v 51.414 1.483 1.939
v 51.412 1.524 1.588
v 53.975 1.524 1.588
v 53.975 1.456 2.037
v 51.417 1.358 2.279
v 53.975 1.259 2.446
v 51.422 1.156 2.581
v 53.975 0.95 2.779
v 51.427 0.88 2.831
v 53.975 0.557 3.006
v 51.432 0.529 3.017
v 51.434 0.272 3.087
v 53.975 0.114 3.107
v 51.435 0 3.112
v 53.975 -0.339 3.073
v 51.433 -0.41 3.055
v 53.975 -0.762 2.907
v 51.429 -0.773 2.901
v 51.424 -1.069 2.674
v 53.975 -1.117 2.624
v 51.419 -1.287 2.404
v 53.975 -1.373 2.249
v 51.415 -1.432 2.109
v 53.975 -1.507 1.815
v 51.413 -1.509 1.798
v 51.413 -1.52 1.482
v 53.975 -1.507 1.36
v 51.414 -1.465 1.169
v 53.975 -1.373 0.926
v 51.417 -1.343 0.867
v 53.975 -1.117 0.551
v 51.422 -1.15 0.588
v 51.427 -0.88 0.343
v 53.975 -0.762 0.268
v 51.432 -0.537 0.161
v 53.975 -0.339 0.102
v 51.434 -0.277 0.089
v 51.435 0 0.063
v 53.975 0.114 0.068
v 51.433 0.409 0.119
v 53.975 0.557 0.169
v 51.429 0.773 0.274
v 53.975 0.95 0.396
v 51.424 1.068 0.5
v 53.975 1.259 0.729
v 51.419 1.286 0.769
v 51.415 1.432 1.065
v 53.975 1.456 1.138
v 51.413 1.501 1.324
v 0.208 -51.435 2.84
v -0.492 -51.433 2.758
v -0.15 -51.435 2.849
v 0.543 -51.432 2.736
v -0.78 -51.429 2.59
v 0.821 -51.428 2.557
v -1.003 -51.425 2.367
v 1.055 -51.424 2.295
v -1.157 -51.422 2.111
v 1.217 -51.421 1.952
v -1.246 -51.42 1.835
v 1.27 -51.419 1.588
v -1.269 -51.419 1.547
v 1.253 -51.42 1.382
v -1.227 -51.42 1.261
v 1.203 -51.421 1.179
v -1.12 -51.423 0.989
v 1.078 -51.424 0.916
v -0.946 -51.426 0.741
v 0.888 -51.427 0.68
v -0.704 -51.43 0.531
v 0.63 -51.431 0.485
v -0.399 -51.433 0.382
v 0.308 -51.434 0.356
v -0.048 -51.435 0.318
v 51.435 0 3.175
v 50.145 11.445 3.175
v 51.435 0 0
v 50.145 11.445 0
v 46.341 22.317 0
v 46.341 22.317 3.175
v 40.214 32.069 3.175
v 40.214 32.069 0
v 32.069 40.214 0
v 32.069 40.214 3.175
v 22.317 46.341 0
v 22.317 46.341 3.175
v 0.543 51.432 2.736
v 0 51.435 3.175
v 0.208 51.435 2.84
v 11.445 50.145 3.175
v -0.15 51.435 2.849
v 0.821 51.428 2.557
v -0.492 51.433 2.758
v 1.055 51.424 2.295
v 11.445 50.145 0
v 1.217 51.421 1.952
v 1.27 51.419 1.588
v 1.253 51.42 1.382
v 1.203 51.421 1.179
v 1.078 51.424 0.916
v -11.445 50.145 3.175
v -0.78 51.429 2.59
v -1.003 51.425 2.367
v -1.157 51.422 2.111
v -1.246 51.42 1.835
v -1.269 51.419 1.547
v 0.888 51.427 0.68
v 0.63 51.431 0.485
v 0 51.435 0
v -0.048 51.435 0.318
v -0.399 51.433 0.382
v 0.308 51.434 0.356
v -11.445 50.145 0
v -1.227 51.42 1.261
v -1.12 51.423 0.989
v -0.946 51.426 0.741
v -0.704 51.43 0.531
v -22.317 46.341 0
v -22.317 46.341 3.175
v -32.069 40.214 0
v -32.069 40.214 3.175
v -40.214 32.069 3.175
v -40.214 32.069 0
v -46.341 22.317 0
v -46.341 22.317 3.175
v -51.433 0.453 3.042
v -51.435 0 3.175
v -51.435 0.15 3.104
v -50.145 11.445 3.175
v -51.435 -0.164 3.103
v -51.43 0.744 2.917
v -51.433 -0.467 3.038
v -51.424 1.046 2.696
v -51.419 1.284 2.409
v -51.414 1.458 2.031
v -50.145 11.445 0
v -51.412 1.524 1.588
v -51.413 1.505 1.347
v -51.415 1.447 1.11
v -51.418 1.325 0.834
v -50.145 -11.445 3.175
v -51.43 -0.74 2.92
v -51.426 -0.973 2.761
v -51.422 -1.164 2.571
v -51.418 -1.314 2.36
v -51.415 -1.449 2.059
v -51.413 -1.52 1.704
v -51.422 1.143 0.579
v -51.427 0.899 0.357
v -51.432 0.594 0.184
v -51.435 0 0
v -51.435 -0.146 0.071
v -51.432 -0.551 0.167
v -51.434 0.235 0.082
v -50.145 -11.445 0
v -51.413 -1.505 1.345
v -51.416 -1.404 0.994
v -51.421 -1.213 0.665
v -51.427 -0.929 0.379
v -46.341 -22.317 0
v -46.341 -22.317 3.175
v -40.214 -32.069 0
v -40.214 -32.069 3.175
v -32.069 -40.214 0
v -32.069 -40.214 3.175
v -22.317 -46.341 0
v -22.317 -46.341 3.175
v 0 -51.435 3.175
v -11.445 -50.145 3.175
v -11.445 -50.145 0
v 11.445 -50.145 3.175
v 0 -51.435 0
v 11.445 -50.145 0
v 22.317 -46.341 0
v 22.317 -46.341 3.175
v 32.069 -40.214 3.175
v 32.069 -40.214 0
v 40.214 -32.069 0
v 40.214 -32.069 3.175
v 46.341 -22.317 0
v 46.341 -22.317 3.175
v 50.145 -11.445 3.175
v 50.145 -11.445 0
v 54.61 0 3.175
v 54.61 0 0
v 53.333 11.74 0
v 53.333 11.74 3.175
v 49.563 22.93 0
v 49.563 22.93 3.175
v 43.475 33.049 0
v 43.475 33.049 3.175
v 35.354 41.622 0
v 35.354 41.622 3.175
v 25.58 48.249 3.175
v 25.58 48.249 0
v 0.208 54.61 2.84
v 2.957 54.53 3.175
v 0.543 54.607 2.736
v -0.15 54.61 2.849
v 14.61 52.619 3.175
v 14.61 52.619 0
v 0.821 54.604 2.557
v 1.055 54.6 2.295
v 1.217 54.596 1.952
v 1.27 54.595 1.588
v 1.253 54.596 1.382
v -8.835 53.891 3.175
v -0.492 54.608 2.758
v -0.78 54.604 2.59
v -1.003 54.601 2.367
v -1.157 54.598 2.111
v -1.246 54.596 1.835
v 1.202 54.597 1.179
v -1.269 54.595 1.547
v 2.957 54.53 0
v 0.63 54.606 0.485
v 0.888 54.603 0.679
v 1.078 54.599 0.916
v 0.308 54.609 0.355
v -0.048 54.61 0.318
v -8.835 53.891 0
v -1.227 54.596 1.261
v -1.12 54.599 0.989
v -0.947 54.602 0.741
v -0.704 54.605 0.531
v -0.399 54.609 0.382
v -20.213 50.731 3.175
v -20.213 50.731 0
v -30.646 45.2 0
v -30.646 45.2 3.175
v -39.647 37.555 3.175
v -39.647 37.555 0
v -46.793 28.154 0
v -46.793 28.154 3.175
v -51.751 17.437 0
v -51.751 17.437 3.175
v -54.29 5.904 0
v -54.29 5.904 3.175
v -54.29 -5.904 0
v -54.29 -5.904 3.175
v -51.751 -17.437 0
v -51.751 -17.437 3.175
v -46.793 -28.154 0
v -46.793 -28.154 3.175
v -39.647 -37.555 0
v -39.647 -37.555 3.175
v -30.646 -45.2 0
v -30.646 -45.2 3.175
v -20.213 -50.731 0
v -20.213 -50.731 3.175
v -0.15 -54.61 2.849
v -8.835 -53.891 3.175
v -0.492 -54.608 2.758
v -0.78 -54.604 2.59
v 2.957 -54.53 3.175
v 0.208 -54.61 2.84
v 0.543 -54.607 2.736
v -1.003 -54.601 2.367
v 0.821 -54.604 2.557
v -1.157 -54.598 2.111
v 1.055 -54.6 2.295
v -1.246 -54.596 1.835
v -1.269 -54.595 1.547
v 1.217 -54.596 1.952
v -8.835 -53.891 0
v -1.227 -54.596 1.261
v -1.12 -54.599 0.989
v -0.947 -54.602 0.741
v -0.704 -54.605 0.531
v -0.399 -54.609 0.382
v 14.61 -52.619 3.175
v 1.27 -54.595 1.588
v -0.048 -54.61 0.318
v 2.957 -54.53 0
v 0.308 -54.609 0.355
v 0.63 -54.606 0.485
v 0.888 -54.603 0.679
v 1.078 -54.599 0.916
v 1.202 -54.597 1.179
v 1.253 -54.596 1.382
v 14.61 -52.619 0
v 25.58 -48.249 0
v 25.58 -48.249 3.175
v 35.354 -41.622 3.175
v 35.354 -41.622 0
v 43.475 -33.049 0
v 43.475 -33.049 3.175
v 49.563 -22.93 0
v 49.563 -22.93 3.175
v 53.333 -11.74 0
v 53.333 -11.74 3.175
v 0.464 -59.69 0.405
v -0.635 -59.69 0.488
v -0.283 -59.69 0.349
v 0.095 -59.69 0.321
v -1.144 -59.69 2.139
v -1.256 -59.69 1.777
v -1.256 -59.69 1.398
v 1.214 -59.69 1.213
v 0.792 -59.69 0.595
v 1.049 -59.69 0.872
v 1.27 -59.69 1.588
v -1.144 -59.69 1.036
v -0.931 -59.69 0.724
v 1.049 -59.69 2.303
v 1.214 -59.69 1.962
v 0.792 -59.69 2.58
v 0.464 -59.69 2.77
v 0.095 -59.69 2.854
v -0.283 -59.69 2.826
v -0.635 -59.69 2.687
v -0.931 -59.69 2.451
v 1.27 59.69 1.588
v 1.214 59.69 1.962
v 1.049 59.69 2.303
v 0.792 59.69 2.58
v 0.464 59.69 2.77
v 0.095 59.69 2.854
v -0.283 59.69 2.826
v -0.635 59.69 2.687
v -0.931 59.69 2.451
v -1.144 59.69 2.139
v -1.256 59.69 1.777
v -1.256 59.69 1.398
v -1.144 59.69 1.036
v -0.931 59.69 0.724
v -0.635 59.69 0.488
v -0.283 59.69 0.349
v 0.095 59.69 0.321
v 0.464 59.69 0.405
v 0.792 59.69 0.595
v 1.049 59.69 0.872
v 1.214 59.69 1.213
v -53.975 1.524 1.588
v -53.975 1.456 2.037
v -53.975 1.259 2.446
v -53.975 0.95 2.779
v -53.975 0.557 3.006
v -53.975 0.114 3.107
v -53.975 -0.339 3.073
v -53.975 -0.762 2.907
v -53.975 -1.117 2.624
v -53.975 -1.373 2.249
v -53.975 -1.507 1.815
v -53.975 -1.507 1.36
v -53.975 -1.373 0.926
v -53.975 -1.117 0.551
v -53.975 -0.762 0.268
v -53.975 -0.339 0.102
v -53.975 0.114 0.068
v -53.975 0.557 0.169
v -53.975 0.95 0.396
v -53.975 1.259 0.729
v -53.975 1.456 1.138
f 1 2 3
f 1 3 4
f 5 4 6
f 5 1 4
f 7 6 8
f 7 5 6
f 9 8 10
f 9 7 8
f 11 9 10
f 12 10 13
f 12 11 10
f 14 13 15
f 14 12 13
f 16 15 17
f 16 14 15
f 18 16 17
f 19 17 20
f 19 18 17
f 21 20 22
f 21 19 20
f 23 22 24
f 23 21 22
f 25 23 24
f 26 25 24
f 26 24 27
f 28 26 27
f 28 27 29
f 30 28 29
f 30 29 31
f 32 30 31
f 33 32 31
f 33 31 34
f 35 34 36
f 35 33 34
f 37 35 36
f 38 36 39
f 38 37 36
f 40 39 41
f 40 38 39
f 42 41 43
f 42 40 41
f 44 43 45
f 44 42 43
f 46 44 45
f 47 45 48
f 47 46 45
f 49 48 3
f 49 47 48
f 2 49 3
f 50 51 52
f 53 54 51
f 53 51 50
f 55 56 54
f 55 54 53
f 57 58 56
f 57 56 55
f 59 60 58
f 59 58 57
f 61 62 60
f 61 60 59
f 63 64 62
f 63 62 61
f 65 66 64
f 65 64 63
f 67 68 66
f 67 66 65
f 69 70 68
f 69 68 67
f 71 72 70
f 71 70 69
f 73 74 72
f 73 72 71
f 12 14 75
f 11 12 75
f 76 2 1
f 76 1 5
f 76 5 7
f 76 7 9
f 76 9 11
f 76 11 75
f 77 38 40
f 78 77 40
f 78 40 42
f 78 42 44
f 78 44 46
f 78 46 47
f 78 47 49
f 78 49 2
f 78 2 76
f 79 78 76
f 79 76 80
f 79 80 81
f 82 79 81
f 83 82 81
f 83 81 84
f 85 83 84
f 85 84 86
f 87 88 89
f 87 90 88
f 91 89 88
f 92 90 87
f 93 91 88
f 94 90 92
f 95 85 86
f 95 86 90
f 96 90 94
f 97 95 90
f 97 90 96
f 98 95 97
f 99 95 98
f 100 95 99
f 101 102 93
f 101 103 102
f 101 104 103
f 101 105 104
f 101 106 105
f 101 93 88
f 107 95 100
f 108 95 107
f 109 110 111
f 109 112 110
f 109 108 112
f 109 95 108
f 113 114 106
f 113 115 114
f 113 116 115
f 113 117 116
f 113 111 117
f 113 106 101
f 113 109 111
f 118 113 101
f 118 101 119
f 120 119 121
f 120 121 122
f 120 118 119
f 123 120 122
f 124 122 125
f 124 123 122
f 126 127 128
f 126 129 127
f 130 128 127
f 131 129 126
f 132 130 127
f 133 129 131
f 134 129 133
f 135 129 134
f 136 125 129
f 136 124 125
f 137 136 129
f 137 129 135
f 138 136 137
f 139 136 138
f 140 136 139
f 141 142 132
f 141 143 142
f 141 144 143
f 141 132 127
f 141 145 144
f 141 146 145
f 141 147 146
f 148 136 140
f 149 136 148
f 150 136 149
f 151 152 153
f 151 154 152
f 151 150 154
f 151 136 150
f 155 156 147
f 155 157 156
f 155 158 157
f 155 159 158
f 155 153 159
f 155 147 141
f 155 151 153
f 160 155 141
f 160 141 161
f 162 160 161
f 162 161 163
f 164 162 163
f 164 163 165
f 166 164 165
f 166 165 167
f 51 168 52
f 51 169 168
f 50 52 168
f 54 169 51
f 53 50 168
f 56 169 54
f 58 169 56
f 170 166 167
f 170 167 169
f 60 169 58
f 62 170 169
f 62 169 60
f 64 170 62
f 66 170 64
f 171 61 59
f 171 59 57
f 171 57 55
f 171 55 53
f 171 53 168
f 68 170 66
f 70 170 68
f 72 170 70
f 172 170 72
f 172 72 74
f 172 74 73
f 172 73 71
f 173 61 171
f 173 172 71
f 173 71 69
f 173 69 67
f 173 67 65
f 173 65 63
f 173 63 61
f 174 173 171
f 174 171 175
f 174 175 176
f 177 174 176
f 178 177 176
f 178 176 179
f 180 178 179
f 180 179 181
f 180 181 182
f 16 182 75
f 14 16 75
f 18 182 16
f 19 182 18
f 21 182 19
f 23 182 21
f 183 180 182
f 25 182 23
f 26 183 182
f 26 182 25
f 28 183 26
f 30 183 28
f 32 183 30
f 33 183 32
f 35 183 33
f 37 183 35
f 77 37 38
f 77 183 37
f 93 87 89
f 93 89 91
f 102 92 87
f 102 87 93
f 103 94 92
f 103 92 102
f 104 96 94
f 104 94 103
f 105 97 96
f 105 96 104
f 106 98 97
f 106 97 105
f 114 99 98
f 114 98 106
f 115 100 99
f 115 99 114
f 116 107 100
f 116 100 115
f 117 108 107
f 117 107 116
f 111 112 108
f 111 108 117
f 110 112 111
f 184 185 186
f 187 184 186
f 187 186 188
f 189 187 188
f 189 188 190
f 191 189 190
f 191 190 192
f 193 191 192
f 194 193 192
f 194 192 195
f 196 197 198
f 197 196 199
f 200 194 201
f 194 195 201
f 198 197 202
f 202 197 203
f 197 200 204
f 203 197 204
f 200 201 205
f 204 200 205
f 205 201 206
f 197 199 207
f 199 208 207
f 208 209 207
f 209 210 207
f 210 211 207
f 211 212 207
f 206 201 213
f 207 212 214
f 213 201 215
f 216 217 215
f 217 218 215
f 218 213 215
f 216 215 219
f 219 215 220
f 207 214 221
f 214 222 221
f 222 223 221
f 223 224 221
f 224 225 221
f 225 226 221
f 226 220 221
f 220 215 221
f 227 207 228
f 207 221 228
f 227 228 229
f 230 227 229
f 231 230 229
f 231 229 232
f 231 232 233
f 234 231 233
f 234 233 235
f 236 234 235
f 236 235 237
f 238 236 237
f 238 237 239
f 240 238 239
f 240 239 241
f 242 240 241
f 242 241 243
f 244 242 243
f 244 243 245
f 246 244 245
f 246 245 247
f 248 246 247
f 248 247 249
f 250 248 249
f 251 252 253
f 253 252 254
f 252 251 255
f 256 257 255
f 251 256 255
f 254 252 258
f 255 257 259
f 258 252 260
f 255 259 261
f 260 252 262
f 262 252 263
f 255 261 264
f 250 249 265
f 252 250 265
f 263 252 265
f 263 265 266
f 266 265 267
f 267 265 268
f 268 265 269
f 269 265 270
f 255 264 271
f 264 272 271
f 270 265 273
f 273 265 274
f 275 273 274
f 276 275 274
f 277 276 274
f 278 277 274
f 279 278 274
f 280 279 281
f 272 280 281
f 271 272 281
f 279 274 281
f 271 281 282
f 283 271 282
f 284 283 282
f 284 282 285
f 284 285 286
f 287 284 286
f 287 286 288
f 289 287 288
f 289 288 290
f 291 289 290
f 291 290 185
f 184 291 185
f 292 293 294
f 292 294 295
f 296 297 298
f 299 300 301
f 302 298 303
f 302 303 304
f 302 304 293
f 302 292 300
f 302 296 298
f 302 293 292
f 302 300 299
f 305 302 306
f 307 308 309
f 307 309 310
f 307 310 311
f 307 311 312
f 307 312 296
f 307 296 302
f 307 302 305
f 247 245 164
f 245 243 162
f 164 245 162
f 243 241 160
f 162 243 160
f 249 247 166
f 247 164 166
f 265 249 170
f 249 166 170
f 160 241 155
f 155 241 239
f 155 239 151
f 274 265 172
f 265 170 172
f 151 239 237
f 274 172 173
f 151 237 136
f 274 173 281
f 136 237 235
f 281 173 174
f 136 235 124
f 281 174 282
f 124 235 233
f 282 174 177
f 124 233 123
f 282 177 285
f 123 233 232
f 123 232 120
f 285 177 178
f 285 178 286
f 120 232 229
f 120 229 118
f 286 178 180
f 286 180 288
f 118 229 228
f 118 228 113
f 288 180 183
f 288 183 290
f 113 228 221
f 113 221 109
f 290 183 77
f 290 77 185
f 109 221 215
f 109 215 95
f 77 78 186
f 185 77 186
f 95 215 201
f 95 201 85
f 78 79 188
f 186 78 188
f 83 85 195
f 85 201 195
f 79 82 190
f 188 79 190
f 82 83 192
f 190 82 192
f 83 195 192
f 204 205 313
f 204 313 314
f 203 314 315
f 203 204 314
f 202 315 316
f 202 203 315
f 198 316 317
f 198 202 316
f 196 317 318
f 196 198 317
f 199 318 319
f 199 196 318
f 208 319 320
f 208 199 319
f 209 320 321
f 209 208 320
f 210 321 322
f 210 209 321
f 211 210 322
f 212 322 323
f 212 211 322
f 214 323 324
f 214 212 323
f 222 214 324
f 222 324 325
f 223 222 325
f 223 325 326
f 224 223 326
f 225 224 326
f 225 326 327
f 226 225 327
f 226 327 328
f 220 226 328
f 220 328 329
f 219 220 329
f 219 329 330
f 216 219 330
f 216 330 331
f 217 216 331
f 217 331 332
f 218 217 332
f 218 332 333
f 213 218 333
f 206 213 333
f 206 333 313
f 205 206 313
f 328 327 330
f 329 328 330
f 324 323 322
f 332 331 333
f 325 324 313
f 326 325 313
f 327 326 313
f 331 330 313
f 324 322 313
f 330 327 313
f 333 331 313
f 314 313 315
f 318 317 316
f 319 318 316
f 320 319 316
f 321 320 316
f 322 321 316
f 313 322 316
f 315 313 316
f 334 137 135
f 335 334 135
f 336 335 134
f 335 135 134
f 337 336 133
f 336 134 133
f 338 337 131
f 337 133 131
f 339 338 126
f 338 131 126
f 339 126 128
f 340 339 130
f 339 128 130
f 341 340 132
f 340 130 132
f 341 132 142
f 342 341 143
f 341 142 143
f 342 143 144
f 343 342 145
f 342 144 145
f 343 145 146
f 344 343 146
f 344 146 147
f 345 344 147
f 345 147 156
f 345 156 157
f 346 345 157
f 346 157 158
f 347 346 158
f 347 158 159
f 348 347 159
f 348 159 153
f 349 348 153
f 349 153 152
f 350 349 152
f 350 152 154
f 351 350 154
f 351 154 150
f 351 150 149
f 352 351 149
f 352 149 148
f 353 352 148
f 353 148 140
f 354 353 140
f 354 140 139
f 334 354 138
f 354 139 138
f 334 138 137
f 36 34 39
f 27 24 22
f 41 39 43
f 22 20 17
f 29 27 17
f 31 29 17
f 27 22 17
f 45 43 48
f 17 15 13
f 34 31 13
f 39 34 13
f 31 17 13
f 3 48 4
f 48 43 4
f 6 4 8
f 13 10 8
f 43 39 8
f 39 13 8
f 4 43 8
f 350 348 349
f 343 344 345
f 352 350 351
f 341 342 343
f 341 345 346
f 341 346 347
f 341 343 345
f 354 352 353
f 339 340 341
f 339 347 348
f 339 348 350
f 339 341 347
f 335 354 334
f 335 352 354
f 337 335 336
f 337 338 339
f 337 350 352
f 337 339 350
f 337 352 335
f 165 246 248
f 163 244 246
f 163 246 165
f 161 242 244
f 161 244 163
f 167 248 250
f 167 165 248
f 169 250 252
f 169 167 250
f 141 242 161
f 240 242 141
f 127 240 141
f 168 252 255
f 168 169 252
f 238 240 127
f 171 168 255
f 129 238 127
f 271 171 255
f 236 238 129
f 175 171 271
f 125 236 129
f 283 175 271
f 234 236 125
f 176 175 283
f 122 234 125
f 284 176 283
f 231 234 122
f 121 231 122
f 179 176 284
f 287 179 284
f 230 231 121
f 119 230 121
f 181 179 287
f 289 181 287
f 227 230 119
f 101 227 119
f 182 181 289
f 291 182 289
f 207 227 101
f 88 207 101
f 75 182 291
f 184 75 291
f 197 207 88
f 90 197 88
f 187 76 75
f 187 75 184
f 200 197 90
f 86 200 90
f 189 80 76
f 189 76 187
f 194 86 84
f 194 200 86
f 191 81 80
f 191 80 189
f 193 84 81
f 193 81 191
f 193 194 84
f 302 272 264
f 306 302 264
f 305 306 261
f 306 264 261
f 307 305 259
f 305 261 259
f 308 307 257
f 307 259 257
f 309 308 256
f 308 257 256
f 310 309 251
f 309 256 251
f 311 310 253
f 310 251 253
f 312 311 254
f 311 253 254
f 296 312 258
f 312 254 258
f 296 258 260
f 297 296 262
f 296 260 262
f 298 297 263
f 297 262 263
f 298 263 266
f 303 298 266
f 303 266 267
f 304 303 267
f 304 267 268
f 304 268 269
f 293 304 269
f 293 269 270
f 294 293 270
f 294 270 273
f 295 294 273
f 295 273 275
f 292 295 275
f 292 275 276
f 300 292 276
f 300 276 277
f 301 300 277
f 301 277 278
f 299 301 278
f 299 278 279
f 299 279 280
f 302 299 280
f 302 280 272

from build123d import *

# Parameters (mm, degrees)
F0_R          = 54.61
F0_R_2        = 51.435
F1_DEPTH      = 3.175
F2_R          = 1.27
F3_DEPTH      = 59.69
F3_DEPTH_BACK = 59.69
F4_R          = 51.435
F5_DEPTH      = 25.4
F6_R          = 1.524
F7_DEPTH      = 53.975
F7_DEPTH_BACK = 53.975


with BuildPart() as f1:
    # F0 (on Top) → F1 (new body)
    with BuildSketch(Plane.XY):
        Circle(F0_R)
        Circle(F0_R_2, mode=Mode.SUBTRACT)
    extrude(amount=F1_DEPTH)

    # F2 (on Front) → F3 (join, two sides)
    with BuildSketch(Plane.XZ) as f3_sk:
        with Locations((0, 1.5875)):
            Circle(F2_R)
    extrude(amount=F3_DEPTH)
    extrude(f3_sk.sketch, amount=-F3_DEPTH_BACK)

    # F4 (on Top) → F5 (cut)
    with BuildSketch(Plane.XY):
        Circle(F4_R)
    extrude(amount=F5_DEPTH, mode=Mode.SUBTRACT)

    # F6 (on Right) → F7 (cut, two sides)
    with BuildSketch(Plane.YZ) as f7_sk:
        with Locations((0, 1.5875)):
            Circle(F6_R)
    extrude(amount=-F7_DEPTH, mode=Mode.SUBTRACT)
    extrude(f7_sk.sketch, amount=F7_DEPTH_BACK, mode=Mode.SUBTRACT)


solid = f1.part
